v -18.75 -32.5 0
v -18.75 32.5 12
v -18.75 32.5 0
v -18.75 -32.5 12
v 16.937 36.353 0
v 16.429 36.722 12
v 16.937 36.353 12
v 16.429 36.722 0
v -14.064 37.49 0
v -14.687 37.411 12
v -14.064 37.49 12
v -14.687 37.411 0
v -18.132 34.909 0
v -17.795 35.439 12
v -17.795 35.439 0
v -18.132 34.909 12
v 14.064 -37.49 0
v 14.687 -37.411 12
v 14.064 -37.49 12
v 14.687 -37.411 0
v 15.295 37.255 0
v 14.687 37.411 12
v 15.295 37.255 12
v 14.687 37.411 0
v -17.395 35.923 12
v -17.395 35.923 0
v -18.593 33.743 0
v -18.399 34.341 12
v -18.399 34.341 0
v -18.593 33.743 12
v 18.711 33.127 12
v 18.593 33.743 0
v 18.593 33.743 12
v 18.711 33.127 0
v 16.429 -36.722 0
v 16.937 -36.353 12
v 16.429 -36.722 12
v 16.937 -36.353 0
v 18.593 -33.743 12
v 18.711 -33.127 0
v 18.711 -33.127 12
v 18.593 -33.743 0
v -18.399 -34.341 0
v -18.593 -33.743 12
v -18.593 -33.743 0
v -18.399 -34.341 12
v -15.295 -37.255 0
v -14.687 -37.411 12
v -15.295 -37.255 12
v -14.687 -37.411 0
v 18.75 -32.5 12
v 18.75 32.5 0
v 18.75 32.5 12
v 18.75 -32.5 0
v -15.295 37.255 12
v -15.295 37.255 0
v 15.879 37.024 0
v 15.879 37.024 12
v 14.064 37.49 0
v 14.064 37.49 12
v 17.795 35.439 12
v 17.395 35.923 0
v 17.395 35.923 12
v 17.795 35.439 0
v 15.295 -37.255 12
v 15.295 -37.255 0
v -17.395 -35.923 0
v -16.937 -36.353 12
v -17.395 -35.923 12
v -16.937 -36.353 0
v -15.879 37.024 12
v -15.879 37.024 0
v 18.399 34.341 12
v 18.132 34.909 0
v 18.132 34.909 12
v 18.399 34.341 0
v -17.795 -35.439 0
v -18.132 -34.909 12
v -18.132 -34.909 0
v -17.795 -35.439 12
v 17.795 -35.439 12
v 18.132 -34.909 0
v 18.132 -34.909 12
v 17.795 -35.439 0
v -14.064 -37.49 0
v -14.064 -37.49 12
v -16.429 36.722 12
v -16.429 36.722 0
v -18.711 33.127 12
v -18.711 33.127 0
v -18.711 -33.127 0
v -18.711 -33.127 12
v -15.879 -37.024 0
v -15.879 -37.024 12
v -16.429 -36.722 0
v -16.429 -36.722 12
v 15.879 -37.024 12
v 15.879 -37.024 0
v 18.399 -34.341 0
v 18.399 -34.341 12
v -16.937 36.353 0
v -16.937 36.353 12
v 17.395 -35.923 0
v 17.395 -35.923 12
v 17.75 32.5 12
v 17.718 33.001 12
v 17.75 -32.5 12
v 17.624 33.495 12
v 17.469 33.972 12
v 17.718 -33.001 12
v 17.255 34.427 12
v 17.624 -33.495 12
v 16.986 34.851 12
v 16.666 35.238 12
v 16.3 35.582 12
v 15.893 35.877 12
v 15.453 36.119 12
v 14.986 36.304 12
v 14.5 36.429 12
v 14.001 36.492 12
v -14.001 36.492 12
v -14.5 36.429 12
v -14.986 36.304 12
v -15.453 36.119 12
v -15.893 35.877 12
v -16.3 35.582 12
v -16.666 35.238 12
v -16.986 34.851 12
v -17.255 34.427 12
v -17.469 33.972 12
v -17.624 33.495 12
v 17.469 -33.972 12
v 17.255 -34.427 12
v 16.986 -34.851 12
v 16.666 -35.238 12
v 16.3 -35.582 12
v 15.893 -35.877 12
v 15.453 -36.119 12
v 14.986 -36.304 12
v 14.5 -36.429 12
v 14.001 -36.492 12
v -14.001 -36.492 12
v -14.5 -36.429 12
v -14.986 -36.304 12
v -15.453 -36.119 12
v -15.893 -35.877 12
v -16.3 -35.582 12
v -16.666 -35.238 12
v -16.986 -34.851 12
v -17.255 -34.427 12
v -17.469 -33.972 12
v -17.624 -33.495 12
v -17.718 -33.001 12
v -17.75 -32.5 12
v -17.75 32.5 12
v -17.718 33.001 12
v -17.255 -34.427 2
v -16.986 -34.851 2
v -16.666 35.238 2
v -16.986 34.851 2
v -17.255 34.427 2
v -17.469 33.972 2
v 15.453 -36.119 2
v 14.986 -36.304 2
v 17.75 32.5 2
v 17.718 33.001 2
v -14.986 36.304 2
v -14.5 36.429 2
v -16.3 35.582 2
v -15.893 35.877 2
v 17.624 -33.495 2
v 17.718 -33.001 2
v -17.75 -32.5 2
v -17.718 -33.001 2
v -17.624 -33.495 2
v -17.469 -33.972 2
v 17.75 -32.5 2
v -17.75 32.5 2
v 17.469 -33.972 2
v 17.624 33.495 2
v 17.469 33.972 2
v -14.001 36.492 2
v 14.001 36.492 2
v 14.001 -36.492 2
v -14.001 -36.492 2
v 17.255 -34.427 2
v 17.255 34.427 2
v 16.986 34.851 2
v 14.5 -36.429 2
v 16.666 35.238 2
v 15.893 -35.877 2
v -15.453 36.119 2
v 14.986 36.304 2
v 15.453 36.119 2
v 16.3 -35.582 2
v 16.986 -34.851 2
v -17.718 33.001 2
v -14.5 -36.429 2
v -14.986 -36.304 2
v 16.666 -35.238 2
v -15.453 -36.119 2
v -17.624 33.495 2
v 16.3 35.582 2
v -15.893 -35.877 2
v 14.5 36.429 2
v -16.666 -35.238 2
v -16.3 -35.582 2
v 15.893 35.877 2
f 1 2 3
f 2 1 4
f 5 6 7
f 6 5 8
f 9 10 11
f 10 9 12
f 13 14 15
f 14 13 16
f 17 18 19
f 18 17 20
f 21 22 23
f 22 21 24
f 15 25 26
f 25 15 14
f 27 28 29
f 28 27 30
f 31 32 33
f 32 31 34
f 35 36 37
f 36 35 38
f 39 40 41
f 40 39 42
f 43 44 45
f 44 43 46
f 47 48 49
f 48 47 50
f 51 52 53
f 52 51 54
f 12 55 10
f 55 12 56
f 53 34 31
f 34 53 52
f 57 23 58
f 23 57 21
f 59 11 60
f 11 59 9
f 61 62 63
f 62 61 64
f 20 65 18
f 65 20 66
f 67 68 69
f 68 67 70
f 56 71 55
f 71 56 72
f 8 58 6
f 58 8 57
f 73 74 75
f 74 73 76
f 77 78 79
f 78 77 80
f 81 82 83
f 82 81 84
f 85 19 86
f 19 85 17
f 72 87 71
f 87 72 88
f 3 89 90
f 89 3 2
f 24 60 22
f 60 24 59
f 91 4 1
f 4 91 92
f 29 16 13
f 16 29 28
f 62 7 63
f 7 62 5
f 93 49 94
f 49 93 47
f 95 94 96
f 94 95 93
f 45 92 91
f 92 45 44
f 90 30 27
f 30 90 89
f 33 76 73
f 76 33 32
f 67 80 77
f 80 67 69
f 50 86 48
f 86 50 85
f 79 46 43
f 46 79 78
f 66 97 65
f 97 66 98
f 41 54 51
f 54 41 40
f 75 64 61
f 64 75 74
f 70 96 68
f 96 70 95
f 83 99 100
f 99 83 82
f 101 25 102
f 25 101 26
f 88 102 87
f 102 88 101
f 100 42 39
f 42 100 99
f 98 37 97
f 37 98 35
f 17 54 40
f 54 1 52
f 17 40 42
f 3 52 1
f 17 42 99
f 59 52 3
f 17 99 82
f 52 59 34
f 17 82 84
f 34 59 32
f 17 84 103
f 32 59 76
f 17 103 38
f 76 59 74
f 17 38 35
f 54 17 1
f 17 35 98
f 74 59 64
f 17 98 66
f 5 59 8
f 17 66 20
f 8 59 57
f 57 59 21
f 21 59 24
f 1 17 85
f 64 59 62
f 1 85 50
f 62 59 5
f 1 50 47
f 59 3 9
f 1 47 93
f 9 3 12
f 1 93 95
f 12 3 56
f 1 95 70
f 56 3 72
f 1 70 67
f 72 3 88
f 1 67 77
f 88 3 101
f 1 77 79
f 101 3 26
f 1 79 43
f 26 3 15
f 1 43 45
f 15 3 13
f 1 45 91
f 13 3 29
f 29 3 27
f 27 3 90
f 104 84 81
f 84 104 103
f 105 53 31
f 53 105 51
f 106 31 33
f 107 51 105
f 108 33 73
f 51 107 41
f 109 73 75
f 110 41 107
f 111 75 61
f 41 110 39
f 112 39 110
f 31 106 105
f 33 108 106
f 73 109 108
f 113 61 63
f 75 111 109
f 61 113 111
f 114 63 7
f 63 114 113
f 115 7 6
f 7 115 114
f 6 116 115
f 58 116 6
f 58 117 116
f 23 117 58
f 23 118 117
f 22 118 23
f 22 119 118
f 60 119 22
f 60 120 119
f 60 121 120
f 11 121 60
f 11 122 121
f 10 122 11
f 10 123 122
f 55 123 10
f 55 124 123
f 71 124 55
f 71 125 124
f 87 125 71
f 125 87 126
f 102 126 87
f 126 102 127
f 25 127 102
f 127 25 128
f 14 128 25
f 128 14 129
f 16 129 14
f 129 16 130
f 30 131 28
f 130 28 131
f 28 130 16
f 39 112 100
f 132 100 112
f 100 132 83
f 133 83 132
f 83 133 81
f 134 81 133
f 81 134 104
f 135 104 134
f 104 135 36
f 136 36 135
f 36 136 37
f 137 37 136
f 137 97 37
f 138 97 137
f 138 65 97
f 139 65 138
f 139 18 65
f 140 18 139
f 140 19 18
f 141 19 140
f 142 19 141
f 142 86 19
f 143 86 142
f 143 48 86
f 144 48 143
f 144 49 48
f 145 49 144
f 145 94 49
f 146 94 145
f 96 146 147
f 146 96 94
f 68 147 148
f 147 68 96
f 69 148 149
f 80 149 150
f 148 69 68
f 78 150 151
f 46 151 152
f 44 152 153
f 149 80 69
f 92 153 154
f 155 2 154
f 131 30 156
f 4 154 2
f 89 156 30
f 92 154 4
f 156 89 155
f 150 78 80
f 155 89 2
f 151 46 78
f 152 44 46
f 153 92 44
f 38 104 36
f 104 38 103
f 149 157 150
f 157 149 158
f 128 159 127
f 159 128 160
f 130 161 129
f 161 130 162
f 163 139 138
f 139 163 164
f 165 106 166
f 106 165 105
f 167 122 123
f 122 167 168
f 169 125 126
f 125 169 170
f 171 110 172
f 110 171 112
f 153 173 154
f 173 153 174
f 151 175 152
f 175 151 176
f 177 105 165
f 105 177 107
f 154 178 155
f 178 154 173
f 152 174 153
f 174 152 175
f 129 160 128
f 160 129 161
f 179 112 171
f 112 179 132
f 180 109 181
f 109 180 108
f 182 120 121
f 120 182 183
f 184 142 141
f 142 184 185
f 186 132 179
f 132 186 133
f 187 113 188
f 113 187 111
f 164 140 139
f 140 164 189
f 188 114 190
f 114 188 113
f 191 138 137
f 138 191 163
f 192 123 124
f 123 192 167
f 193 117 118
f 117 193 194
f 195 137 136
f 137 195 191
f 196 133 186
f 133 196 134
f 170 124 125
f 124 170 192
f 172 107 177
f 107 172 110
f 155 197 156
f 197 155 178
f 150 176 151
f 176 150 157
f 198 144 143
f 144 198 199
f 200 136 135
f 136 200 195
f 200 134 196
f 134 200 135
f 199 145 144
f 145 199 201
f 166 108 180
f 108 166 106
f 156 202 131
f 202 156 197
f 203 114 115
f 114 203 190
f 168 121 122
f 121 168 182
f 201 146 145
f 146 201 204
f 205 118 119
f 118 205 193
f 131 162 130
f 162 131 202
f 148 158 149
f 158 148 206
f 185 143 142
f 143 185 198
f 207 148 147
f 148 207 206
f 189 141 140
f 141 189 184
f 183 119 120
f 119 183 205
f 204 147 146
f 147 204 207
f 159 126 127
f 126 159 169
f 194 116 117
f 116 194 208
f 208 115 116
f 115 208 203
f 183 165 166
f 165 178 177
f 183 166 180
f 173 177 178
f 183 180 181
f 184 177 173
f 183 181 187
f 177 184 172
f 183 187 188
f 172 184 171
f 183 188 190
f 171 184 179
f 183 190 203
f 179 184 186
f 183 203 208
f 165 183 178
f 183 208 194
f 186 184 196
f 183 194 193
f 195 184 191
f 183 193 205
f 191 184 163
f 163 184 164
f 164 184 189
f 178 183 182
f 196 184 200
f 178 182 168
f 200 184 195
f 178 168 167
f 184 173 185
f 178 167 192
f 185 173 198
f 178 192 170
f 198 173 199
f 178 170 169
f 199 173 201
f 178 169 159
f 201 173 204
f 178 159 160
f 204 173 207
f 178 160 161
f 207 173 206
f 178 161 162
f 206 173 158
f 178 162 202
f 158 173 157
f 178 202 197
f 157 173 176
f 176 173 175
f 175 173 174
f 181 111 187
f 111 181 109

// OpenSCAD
$fn = 50;


difference() {
	union() {
		hull() {
			translate(v = [-13.7500000000, 32.5000000000, 0]) {
				cylinder(h = 12, r = 5);
			}
			translate(v = [13.7500000000, 32.5000000000, 0]) {
				cylinder(h = 12, r = 5);
			}
			translate(v = [-13.7500000000, -32.5000000000, 0]) {
				cylinder(h = 12, r = 5);
			}
			translate(v = [13.7500000000, -32.5000000000, 0]) {
				cylinder(h = 12, r = 5);
			}
		}
	}
	union() {
		translate(v = [0, 0, 2]) {
			hull() {
				translate(v = [-13.7500000000, 32.5000000000, 0]) {
					cylinder(h = 10, r = 4);
				}
				translate(v = [13.7500000000, 32.5000000000, 0]) {
					cylinder(h = 10, r = 4);
				}
				translate(v = [-13.7500000000, -32.5000000000, 0]) {
					cylinder(h = 10, r = 4);
				}
				translate(v = [13.7500000000, -32.5000000000, 0]) {
					cylinder(h = 10, r = 4);
				}
			}
		}
	}
}
